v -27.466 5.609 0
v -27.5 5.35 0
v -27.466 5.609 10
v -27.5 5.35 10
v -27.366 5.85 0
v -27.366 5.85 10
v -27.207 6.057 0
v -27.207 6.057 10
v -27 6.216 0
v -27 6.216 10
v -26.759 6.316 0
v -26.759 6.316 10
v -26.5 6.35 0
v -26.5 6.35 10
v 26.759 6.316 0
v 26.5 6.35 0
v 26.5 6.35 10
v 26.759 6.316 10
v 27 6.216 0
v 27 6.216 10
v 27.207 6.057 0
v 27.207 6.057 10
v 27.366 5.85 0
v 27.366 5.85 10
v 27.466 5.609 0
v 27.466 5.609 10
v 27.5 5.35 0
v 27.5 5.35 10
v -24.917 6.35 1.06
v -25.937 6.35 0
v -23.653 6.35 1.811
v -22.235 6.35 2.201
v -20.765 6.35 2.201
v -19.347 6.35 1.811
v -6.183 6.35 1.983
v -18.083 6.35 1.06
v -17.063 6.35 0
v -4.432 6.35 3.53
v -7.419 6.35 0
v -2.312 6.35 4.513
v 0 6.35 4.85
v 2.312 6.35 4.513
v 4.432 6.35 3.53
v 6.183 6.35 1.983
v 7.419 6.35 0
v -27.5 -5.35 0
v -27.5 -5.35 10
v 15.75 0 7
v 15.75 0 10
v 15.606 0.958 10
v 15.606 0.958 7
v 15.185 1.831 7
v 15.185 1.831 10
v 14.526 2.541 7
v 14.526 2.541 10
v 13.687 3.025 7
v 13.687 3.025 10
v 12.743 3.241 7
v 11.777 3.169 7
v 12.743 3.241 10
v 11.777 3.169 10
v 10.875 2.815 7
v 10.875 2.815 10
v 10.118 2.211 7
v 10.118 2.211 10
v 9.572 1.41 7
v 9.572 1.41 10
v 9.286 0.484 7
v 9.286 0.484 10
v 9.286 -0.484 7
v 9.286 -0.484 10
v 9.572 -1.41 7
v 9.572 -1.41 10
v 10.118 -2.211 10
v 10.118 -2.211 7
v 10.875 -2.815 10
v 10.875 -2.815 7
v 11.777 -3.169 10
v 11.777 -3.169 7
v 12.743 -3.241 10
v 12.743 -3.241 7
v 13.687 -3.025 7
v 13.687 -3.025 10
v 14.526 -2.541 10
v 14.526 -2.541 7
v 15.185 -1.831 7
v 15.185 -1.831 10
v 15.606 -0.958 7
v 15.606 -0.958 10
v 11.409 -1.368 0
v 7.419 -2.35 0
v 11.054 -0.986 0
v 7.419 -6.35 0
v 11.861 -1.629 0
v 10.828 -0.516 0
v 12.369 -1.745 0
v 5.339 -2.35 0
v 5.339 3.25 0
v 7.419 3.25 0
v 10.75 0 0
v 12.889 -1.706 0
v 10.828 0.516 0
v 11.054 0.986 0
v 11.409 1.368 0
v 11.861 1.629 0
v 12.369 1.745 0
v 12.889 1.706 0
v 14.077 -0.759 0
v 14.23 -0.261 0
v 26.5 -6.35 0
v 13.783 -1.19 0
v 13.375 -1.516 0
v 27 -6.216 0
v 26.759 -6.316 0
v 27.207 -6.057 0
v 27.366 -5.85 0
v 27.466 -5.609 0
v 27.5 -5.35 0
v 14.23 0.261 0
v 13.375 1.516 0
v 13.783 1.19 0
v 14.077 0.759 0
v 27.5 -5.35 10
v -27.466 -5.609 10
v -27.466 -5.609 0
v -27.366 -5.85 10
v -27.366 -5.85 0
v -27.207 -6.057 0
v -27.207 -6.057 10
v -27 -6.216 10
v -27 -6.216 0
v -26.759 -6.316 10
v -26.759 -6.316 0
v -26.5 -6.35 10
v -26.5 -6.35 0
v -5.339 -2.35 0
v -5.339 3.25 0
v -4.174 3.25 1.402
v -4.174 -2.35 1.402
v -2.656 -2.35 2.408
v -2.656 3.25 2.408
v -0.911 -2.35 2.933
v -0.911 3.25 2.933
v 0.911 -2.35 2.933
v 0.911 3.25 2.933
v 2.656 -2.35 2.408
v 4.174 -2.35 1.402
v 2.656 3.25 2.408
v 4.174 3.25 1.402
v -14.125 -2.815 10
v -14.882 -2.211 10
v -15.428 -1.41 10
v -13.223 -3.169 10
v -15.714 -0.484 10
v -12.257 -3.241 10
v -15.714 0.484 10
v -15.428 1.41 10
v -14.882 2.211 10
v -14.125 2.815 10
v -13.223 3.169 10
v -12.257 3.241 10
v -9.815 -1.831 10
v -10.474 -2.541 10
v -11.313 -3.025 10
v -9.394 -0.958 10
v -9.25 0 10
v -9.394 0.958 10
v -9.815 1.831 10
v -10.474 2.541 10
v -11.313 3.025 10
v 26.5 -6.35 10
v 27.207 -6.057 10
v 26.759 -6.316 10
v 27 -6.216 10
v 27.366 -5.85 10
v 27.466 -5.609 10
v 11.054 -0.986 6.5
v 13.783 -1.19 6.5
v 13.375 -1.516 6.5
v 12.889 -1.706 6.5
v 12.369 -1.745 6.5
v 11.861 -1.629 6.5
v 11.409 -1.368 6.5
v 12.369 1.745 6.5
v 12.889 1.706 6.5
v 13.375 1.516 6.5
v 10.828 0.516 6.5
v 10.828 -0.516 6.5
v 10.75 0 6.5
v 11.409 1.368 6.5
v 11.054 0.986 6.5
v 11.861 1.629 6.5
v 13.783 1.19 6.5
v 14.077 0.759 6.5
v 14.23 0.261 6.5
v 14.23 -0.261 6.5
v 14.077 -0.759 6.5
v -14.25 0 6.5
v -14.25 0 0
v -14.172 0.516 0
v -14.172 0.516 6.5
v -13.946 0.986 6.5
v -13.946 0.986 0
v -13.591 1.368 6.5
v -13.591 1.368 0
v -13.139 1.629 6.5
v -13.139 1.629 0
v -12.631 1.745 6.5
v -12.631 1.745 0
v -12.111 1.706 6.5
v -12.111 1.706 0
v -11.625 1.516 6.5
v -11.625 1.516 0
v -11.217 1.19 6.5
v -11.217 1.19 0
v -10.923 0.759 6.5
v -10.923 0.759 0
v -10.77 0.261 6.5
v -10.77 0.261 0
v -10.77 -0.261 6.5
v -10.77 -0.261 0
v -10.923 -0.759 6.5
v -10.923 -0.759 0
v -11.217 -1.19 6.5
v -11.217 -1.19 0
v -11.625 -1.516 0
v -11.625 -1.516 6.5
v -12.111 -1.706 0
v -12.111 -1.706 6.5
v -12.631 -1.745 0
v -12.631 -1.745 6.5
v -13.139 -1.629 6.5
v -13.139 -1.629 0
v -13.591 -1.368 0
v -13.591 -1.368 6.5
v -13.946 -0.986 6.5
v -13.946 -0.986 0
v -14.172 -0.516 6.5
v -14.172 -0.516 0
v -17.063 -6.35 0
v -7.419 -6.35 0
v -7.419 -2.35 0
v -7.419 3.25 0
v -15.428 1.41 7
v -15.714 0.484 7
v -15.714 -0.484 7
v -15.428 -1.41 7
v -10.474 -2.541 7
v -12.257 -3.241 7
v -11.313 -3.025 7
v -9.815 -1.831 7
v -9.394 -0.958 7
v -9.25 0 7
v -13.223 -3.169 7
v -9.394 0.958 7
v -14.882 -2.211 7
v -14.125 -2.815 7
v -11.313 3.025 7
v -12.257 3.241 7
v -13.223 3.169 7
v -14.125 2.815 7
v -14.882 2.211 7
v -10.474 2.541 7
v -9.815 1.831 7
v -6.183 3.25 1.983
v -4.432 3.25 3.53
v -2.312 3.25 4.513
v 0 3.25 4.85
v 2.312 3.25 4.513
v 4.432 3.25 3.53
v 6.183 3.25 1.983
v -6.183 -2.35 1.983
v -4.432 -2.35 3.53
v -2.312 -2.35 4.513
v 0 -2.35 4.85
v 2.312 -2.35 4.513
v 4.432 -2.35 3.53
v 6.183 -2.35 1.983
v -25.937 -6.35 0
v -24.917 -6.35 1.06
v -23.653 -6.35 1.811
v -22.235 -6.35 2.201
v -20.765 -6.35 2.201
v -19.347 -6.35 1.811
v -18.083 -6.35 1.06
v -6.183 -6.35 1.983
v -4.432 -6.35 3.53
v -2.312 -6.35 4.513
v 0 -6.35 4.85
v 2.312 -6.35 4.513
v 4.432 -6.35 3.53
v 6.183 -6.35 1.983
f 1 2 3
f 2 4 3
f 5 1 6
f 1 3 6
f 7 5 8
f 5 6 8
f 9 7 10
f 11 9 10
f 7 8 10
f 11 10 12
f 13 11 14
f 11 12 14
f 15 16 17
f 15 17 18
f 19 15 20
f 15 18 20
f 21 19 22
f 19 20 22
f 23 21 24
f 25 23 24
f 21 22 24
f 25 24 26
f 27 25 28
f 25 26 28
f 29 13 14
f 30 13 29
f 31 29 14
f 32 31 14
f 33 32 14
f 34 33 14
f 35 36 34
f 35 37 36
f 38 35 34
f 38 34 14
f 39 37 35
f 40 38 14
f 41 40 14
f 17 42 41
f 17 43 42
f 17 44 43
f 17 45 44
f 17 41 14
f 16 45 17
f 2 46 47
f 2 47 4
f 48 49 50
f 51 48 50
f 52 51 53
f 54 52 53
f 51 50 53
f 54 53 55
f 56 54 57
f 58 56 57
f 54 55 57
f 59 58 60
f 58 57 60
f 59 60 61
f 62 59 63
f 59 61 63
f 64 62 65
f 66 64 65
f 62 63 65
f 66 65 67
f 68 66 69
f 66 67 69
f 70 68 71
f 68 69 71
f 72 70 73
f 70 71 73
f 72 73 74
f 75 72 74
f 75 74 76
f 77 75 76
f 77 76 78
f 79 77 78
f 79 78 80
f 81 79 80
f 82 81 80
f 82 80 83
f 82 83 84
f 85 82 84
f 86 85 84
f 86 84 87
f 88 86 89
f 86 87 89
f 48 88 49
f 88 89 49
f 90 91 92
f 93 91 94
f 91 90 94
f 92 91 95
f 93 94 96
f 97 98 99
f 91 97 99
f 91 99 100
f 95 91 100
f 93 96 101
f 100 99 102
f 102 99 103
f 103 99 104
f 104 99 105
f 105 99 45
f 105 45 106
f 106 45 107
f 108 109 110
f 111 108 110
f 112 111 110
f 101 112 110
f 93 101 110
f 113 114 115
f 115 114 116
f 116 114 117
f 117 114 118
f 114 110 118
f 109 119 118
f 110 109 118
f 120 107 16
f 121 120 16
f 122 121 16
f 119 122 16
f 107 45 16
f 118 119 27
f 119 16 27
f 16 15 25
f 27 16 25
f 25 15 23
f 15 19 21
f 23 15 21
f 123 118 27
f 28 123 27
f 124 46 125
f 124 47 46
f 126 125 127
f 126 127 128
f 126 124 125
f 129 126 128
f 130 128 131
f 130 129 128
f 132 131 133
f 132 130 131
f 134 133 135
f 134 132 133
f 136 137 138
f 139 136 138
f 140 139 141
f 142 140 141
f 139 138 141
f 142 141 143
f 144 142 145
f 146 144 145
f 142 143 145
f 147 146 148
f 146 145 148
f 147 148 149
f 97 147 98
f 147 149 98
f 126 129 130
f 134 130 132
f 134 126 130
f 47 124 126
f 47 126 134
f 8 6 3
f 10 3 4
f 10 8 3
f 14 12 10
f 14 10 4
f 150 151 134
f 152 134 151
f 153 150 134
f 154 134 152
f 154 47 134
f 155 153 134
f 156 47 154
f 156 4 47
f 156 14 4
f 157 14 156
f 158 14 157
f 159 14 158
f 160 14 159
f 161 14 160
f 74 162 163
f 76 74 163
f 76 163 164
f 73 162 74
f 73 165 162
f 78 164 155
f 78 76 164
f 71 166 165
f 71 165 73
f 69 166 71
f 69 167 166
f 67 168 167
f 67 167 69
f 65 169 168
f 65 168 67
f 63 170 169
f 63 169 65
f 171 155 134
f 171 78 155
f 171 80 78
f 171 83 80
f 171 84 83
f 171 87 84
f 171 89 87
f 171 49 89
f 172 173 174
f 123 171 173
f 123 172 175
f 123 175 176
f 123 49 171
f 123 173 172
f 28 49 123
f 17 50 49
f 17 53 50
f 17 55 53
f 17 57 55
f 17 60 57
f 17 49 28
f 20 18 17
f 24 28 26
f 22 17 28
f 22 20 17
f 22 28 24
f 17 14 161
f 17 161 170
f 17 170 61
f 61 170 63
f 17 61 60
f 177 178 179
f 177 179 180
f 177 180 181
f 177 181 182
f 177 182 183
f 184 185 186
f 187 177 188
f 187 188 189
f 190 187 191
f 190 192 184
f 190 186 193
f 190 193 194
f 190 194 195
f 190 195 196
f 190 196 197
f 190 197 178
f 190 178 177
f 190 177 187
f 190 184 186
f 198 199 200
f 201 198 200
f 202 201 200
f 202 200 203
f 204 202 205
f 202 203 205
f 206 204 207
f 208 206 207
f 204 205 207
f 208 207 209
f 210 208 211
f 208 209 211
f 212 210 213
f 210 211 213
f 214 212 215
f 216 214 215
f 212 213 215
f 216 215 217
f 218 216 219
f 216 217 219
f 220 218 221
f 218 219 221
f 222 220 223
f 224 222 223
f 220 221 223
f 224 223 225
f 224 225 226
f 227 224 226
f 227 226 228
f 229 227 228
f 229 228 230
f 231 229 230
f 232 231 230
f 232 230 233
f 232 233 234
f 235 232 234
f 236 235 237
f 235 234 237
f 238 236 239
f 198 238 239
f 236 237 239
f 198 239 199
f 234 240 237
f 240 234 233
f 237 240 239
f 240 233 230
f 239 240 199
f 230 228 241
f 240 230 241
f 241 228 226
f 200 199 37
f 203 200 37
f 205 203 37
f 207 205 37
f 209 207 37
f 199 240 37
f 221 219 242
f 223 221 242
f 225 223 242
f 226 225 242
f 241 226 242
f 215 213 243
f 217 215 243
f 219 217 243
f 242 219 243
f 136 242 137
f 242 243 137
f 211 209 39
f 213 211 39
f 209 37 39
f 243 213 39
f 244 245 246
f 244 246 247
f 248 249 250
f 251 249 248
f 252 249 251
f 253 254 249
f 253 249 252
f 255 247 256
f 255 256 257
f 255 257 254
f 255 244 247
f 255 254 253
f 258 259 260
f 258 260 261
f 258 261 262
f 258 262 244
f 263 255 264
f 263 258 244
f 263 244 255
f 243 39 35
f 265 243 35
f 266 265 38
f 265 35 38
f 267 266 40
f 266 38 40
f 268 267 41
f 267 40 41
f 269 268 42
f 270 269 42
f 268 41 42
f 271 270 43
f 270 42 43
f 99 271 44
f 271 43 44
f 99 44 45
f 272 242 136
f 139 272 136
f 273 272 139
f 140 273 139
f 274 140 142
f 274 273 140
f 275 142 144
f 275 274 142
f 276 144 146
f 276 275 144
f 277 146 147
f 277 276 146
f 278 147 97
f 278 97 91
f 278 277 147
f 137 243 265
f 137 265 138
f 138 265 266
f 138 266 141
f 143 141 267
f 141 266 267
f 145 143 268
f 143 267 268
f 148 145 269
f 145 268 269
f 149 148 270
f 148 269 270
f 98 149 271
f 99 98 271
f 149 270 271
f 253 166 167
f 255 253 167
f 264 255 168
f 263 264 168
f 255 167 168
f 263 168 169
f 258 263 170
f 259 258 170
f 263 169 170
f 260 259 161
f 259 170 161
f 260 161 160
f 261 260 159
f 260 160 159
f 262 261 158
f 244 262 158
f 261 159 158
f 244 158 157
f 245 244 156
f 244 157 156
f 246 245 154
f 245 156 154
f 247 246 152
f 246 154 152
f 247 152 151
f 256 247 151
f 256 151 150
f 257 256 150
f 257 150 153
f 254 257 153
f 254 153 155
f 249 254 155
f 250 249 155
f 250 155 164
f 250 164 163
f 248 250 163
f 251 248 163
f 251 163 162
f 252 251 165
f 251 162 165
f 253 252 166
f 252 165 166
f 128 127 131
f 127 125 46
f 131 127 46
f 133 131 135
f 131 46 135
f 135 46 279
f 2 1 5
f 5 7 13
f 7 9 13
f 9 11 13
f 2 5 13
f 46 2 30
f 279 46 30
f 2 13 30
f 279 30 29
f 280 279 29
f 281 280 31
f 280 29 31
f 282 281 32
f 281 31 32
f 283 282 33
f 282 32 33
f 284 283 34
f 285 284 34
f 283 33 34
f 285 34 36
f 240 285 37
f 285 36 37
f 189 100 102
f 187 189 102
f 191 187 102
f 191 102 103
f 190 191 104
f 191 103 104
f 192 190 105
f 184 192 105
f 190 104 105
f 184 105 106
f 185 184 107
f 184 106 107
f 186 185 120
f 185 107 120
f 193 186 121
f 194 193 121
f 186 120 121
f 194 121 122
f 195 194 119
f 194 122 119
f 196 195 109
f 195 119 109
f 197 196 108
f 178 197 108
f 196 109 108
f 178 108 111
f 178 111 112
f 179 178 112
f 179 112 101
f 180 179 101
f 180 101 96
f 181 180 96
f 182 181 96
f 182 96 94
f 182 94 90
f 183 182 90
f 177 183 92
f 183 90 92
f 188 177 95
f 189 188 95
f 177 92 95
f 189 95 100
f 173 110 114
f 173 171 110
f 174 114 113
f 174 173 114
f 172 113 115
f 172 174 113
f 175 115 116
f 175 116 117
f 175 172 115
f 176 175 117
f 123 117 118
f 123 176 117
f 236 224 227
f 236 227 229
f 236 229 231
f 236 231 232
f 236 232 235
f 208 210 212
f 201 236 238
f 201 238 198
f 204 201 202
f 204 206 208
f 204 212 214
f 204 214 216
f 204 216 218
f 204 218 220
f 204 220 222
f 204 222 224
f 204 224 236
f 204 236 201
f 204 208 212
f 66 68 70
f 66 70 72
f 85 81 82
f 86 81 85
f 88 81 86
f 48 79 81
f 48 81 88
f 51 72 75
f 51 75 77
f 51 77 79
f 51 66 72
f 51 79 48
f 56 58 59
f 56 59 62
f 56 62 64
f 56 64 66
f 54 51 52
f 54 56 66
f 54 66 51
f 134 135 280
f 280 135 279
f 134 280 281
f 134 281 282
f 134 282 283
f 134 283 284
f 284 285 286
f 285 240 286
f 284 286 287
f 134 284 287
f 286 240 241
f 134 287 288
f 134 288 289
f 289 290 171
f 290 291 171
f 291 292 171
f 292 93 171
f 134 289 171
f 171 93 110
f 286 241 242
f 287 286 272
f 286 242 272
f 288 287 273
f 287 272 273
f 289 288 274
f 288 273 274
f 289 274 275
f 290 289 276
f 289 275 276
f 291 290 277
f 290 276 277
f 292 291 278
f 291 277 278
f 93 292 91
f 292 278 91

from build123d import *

# Parameters (mm, degrees)
SKETCH1_W           = 55
SKETCH1_H           = 12.7
BOSS_EXTRUDE1_DEPTH = 10
CUT_EXTRUDE1_DEPTH  = 32.898902802
SKETCH6_W           = 8.1
SKETCH6_H           = 3.1
SKETCH6_H_2         = 4
SKETCH7_R           = 1.75
CUT_EXTRUDE2_DEPTH  = 6.5
SKETCH8_R           = 3.25
CUT_EXTRUDE3_DEPTH  = 3
FILLET1_R           = 1


with BuildPart() as part:
    # Sketch1 → Boss-Extrude1 (new body)
    with BuildSketch(Plane.XY):
        Rectangle(SKETCH1_W, SKETCH1_H)
    extrude(amount=BOSS_EXTRUDE1_DEPTH)

    # Sketch2 → Cut-Extrude1 (cut, through all)
    with BuildSketch(Plane(origin=(0, 6.35, 0), x_dir=(1, 0, 0), z_dir=(0, 1, 0))):
        with BuildLine():
            Line((5.338539126, 0), (-5.338539126, 0))
            ThreePointArc((-5.338539126, 0), (0, -3), (5.338539126, 0))
        make_face()
        with BuildLine():
            Line((-17.062940163, 0), (-25.937059837, 0))
            ThreePointArc((-25.937059837, 0), (-21.5, -2.25), (-17.062940163, 0))
        make_face()
    extrude(amount=-CUT_EXTRUDE1_DEPTH, mode=Mode.SUBTRACT)

    # Sketch6 → Cut-Revolve1 (revolve, cut)
    with BuildSketch(Plane(origin=(0, 0, -3.25), x_dir=(-1, 0, 0), z_dir=(0, 0, -1))):
        with Locations((4.05, 4.8)):
            Rectangle(SKETCH6_W, SKETCH6_H)
        with Locations((4.05, -4.35)):
            Rectangle(SKETCH6_W, SKETCH6_H_2)
    revolve(axis=Axis((0, -6.35, -3.25), (0, 1, 0)), mode=Mode.SUBTRACT)

    # Sketch7 → Cut-Extrude2 (cut)
    with BuildSketch(Plane(origin=(0, 0, 0), x_dir=(-1, 0, 0), z_dir=(0, 0, -1))):
        with Locations((12.5, 0)):
            Circle(SKETCH7_R)
        with Locations((-12.5, 0)):
            Circle(SKETCH7_R)
    extrude(amount=-CUT_EXTRUDE2_DEPTH, mode=Mode.SUBTRACT)

    # Sketch8 → Cut-Extrude3 (cut)
    with BuildSketch(Plane.XY.offset(10)):
        with Locations((-12.5, 0)):
            Circle(SKETCH8_R)
        with Locations((12.5, 0)):
            Circle(SKETCH8_R)
    extrude(amount=-CUT_EXTRUDE3_DEPTH, mode=Mode.SUBTRACT)

    # Fillet1
    fillet1_edges = [part.edges().sort_by_distance(p)[0] for p in [
        (-27.5, 6.35, 5),
        (27.5, 6.35, 5),
        (27.5, -6.35, 5),
        (-27.5, -6.35, 5),
    ]]
    fillet(fillet1_edges, radius=FILLET1_R)


solid = part.part
